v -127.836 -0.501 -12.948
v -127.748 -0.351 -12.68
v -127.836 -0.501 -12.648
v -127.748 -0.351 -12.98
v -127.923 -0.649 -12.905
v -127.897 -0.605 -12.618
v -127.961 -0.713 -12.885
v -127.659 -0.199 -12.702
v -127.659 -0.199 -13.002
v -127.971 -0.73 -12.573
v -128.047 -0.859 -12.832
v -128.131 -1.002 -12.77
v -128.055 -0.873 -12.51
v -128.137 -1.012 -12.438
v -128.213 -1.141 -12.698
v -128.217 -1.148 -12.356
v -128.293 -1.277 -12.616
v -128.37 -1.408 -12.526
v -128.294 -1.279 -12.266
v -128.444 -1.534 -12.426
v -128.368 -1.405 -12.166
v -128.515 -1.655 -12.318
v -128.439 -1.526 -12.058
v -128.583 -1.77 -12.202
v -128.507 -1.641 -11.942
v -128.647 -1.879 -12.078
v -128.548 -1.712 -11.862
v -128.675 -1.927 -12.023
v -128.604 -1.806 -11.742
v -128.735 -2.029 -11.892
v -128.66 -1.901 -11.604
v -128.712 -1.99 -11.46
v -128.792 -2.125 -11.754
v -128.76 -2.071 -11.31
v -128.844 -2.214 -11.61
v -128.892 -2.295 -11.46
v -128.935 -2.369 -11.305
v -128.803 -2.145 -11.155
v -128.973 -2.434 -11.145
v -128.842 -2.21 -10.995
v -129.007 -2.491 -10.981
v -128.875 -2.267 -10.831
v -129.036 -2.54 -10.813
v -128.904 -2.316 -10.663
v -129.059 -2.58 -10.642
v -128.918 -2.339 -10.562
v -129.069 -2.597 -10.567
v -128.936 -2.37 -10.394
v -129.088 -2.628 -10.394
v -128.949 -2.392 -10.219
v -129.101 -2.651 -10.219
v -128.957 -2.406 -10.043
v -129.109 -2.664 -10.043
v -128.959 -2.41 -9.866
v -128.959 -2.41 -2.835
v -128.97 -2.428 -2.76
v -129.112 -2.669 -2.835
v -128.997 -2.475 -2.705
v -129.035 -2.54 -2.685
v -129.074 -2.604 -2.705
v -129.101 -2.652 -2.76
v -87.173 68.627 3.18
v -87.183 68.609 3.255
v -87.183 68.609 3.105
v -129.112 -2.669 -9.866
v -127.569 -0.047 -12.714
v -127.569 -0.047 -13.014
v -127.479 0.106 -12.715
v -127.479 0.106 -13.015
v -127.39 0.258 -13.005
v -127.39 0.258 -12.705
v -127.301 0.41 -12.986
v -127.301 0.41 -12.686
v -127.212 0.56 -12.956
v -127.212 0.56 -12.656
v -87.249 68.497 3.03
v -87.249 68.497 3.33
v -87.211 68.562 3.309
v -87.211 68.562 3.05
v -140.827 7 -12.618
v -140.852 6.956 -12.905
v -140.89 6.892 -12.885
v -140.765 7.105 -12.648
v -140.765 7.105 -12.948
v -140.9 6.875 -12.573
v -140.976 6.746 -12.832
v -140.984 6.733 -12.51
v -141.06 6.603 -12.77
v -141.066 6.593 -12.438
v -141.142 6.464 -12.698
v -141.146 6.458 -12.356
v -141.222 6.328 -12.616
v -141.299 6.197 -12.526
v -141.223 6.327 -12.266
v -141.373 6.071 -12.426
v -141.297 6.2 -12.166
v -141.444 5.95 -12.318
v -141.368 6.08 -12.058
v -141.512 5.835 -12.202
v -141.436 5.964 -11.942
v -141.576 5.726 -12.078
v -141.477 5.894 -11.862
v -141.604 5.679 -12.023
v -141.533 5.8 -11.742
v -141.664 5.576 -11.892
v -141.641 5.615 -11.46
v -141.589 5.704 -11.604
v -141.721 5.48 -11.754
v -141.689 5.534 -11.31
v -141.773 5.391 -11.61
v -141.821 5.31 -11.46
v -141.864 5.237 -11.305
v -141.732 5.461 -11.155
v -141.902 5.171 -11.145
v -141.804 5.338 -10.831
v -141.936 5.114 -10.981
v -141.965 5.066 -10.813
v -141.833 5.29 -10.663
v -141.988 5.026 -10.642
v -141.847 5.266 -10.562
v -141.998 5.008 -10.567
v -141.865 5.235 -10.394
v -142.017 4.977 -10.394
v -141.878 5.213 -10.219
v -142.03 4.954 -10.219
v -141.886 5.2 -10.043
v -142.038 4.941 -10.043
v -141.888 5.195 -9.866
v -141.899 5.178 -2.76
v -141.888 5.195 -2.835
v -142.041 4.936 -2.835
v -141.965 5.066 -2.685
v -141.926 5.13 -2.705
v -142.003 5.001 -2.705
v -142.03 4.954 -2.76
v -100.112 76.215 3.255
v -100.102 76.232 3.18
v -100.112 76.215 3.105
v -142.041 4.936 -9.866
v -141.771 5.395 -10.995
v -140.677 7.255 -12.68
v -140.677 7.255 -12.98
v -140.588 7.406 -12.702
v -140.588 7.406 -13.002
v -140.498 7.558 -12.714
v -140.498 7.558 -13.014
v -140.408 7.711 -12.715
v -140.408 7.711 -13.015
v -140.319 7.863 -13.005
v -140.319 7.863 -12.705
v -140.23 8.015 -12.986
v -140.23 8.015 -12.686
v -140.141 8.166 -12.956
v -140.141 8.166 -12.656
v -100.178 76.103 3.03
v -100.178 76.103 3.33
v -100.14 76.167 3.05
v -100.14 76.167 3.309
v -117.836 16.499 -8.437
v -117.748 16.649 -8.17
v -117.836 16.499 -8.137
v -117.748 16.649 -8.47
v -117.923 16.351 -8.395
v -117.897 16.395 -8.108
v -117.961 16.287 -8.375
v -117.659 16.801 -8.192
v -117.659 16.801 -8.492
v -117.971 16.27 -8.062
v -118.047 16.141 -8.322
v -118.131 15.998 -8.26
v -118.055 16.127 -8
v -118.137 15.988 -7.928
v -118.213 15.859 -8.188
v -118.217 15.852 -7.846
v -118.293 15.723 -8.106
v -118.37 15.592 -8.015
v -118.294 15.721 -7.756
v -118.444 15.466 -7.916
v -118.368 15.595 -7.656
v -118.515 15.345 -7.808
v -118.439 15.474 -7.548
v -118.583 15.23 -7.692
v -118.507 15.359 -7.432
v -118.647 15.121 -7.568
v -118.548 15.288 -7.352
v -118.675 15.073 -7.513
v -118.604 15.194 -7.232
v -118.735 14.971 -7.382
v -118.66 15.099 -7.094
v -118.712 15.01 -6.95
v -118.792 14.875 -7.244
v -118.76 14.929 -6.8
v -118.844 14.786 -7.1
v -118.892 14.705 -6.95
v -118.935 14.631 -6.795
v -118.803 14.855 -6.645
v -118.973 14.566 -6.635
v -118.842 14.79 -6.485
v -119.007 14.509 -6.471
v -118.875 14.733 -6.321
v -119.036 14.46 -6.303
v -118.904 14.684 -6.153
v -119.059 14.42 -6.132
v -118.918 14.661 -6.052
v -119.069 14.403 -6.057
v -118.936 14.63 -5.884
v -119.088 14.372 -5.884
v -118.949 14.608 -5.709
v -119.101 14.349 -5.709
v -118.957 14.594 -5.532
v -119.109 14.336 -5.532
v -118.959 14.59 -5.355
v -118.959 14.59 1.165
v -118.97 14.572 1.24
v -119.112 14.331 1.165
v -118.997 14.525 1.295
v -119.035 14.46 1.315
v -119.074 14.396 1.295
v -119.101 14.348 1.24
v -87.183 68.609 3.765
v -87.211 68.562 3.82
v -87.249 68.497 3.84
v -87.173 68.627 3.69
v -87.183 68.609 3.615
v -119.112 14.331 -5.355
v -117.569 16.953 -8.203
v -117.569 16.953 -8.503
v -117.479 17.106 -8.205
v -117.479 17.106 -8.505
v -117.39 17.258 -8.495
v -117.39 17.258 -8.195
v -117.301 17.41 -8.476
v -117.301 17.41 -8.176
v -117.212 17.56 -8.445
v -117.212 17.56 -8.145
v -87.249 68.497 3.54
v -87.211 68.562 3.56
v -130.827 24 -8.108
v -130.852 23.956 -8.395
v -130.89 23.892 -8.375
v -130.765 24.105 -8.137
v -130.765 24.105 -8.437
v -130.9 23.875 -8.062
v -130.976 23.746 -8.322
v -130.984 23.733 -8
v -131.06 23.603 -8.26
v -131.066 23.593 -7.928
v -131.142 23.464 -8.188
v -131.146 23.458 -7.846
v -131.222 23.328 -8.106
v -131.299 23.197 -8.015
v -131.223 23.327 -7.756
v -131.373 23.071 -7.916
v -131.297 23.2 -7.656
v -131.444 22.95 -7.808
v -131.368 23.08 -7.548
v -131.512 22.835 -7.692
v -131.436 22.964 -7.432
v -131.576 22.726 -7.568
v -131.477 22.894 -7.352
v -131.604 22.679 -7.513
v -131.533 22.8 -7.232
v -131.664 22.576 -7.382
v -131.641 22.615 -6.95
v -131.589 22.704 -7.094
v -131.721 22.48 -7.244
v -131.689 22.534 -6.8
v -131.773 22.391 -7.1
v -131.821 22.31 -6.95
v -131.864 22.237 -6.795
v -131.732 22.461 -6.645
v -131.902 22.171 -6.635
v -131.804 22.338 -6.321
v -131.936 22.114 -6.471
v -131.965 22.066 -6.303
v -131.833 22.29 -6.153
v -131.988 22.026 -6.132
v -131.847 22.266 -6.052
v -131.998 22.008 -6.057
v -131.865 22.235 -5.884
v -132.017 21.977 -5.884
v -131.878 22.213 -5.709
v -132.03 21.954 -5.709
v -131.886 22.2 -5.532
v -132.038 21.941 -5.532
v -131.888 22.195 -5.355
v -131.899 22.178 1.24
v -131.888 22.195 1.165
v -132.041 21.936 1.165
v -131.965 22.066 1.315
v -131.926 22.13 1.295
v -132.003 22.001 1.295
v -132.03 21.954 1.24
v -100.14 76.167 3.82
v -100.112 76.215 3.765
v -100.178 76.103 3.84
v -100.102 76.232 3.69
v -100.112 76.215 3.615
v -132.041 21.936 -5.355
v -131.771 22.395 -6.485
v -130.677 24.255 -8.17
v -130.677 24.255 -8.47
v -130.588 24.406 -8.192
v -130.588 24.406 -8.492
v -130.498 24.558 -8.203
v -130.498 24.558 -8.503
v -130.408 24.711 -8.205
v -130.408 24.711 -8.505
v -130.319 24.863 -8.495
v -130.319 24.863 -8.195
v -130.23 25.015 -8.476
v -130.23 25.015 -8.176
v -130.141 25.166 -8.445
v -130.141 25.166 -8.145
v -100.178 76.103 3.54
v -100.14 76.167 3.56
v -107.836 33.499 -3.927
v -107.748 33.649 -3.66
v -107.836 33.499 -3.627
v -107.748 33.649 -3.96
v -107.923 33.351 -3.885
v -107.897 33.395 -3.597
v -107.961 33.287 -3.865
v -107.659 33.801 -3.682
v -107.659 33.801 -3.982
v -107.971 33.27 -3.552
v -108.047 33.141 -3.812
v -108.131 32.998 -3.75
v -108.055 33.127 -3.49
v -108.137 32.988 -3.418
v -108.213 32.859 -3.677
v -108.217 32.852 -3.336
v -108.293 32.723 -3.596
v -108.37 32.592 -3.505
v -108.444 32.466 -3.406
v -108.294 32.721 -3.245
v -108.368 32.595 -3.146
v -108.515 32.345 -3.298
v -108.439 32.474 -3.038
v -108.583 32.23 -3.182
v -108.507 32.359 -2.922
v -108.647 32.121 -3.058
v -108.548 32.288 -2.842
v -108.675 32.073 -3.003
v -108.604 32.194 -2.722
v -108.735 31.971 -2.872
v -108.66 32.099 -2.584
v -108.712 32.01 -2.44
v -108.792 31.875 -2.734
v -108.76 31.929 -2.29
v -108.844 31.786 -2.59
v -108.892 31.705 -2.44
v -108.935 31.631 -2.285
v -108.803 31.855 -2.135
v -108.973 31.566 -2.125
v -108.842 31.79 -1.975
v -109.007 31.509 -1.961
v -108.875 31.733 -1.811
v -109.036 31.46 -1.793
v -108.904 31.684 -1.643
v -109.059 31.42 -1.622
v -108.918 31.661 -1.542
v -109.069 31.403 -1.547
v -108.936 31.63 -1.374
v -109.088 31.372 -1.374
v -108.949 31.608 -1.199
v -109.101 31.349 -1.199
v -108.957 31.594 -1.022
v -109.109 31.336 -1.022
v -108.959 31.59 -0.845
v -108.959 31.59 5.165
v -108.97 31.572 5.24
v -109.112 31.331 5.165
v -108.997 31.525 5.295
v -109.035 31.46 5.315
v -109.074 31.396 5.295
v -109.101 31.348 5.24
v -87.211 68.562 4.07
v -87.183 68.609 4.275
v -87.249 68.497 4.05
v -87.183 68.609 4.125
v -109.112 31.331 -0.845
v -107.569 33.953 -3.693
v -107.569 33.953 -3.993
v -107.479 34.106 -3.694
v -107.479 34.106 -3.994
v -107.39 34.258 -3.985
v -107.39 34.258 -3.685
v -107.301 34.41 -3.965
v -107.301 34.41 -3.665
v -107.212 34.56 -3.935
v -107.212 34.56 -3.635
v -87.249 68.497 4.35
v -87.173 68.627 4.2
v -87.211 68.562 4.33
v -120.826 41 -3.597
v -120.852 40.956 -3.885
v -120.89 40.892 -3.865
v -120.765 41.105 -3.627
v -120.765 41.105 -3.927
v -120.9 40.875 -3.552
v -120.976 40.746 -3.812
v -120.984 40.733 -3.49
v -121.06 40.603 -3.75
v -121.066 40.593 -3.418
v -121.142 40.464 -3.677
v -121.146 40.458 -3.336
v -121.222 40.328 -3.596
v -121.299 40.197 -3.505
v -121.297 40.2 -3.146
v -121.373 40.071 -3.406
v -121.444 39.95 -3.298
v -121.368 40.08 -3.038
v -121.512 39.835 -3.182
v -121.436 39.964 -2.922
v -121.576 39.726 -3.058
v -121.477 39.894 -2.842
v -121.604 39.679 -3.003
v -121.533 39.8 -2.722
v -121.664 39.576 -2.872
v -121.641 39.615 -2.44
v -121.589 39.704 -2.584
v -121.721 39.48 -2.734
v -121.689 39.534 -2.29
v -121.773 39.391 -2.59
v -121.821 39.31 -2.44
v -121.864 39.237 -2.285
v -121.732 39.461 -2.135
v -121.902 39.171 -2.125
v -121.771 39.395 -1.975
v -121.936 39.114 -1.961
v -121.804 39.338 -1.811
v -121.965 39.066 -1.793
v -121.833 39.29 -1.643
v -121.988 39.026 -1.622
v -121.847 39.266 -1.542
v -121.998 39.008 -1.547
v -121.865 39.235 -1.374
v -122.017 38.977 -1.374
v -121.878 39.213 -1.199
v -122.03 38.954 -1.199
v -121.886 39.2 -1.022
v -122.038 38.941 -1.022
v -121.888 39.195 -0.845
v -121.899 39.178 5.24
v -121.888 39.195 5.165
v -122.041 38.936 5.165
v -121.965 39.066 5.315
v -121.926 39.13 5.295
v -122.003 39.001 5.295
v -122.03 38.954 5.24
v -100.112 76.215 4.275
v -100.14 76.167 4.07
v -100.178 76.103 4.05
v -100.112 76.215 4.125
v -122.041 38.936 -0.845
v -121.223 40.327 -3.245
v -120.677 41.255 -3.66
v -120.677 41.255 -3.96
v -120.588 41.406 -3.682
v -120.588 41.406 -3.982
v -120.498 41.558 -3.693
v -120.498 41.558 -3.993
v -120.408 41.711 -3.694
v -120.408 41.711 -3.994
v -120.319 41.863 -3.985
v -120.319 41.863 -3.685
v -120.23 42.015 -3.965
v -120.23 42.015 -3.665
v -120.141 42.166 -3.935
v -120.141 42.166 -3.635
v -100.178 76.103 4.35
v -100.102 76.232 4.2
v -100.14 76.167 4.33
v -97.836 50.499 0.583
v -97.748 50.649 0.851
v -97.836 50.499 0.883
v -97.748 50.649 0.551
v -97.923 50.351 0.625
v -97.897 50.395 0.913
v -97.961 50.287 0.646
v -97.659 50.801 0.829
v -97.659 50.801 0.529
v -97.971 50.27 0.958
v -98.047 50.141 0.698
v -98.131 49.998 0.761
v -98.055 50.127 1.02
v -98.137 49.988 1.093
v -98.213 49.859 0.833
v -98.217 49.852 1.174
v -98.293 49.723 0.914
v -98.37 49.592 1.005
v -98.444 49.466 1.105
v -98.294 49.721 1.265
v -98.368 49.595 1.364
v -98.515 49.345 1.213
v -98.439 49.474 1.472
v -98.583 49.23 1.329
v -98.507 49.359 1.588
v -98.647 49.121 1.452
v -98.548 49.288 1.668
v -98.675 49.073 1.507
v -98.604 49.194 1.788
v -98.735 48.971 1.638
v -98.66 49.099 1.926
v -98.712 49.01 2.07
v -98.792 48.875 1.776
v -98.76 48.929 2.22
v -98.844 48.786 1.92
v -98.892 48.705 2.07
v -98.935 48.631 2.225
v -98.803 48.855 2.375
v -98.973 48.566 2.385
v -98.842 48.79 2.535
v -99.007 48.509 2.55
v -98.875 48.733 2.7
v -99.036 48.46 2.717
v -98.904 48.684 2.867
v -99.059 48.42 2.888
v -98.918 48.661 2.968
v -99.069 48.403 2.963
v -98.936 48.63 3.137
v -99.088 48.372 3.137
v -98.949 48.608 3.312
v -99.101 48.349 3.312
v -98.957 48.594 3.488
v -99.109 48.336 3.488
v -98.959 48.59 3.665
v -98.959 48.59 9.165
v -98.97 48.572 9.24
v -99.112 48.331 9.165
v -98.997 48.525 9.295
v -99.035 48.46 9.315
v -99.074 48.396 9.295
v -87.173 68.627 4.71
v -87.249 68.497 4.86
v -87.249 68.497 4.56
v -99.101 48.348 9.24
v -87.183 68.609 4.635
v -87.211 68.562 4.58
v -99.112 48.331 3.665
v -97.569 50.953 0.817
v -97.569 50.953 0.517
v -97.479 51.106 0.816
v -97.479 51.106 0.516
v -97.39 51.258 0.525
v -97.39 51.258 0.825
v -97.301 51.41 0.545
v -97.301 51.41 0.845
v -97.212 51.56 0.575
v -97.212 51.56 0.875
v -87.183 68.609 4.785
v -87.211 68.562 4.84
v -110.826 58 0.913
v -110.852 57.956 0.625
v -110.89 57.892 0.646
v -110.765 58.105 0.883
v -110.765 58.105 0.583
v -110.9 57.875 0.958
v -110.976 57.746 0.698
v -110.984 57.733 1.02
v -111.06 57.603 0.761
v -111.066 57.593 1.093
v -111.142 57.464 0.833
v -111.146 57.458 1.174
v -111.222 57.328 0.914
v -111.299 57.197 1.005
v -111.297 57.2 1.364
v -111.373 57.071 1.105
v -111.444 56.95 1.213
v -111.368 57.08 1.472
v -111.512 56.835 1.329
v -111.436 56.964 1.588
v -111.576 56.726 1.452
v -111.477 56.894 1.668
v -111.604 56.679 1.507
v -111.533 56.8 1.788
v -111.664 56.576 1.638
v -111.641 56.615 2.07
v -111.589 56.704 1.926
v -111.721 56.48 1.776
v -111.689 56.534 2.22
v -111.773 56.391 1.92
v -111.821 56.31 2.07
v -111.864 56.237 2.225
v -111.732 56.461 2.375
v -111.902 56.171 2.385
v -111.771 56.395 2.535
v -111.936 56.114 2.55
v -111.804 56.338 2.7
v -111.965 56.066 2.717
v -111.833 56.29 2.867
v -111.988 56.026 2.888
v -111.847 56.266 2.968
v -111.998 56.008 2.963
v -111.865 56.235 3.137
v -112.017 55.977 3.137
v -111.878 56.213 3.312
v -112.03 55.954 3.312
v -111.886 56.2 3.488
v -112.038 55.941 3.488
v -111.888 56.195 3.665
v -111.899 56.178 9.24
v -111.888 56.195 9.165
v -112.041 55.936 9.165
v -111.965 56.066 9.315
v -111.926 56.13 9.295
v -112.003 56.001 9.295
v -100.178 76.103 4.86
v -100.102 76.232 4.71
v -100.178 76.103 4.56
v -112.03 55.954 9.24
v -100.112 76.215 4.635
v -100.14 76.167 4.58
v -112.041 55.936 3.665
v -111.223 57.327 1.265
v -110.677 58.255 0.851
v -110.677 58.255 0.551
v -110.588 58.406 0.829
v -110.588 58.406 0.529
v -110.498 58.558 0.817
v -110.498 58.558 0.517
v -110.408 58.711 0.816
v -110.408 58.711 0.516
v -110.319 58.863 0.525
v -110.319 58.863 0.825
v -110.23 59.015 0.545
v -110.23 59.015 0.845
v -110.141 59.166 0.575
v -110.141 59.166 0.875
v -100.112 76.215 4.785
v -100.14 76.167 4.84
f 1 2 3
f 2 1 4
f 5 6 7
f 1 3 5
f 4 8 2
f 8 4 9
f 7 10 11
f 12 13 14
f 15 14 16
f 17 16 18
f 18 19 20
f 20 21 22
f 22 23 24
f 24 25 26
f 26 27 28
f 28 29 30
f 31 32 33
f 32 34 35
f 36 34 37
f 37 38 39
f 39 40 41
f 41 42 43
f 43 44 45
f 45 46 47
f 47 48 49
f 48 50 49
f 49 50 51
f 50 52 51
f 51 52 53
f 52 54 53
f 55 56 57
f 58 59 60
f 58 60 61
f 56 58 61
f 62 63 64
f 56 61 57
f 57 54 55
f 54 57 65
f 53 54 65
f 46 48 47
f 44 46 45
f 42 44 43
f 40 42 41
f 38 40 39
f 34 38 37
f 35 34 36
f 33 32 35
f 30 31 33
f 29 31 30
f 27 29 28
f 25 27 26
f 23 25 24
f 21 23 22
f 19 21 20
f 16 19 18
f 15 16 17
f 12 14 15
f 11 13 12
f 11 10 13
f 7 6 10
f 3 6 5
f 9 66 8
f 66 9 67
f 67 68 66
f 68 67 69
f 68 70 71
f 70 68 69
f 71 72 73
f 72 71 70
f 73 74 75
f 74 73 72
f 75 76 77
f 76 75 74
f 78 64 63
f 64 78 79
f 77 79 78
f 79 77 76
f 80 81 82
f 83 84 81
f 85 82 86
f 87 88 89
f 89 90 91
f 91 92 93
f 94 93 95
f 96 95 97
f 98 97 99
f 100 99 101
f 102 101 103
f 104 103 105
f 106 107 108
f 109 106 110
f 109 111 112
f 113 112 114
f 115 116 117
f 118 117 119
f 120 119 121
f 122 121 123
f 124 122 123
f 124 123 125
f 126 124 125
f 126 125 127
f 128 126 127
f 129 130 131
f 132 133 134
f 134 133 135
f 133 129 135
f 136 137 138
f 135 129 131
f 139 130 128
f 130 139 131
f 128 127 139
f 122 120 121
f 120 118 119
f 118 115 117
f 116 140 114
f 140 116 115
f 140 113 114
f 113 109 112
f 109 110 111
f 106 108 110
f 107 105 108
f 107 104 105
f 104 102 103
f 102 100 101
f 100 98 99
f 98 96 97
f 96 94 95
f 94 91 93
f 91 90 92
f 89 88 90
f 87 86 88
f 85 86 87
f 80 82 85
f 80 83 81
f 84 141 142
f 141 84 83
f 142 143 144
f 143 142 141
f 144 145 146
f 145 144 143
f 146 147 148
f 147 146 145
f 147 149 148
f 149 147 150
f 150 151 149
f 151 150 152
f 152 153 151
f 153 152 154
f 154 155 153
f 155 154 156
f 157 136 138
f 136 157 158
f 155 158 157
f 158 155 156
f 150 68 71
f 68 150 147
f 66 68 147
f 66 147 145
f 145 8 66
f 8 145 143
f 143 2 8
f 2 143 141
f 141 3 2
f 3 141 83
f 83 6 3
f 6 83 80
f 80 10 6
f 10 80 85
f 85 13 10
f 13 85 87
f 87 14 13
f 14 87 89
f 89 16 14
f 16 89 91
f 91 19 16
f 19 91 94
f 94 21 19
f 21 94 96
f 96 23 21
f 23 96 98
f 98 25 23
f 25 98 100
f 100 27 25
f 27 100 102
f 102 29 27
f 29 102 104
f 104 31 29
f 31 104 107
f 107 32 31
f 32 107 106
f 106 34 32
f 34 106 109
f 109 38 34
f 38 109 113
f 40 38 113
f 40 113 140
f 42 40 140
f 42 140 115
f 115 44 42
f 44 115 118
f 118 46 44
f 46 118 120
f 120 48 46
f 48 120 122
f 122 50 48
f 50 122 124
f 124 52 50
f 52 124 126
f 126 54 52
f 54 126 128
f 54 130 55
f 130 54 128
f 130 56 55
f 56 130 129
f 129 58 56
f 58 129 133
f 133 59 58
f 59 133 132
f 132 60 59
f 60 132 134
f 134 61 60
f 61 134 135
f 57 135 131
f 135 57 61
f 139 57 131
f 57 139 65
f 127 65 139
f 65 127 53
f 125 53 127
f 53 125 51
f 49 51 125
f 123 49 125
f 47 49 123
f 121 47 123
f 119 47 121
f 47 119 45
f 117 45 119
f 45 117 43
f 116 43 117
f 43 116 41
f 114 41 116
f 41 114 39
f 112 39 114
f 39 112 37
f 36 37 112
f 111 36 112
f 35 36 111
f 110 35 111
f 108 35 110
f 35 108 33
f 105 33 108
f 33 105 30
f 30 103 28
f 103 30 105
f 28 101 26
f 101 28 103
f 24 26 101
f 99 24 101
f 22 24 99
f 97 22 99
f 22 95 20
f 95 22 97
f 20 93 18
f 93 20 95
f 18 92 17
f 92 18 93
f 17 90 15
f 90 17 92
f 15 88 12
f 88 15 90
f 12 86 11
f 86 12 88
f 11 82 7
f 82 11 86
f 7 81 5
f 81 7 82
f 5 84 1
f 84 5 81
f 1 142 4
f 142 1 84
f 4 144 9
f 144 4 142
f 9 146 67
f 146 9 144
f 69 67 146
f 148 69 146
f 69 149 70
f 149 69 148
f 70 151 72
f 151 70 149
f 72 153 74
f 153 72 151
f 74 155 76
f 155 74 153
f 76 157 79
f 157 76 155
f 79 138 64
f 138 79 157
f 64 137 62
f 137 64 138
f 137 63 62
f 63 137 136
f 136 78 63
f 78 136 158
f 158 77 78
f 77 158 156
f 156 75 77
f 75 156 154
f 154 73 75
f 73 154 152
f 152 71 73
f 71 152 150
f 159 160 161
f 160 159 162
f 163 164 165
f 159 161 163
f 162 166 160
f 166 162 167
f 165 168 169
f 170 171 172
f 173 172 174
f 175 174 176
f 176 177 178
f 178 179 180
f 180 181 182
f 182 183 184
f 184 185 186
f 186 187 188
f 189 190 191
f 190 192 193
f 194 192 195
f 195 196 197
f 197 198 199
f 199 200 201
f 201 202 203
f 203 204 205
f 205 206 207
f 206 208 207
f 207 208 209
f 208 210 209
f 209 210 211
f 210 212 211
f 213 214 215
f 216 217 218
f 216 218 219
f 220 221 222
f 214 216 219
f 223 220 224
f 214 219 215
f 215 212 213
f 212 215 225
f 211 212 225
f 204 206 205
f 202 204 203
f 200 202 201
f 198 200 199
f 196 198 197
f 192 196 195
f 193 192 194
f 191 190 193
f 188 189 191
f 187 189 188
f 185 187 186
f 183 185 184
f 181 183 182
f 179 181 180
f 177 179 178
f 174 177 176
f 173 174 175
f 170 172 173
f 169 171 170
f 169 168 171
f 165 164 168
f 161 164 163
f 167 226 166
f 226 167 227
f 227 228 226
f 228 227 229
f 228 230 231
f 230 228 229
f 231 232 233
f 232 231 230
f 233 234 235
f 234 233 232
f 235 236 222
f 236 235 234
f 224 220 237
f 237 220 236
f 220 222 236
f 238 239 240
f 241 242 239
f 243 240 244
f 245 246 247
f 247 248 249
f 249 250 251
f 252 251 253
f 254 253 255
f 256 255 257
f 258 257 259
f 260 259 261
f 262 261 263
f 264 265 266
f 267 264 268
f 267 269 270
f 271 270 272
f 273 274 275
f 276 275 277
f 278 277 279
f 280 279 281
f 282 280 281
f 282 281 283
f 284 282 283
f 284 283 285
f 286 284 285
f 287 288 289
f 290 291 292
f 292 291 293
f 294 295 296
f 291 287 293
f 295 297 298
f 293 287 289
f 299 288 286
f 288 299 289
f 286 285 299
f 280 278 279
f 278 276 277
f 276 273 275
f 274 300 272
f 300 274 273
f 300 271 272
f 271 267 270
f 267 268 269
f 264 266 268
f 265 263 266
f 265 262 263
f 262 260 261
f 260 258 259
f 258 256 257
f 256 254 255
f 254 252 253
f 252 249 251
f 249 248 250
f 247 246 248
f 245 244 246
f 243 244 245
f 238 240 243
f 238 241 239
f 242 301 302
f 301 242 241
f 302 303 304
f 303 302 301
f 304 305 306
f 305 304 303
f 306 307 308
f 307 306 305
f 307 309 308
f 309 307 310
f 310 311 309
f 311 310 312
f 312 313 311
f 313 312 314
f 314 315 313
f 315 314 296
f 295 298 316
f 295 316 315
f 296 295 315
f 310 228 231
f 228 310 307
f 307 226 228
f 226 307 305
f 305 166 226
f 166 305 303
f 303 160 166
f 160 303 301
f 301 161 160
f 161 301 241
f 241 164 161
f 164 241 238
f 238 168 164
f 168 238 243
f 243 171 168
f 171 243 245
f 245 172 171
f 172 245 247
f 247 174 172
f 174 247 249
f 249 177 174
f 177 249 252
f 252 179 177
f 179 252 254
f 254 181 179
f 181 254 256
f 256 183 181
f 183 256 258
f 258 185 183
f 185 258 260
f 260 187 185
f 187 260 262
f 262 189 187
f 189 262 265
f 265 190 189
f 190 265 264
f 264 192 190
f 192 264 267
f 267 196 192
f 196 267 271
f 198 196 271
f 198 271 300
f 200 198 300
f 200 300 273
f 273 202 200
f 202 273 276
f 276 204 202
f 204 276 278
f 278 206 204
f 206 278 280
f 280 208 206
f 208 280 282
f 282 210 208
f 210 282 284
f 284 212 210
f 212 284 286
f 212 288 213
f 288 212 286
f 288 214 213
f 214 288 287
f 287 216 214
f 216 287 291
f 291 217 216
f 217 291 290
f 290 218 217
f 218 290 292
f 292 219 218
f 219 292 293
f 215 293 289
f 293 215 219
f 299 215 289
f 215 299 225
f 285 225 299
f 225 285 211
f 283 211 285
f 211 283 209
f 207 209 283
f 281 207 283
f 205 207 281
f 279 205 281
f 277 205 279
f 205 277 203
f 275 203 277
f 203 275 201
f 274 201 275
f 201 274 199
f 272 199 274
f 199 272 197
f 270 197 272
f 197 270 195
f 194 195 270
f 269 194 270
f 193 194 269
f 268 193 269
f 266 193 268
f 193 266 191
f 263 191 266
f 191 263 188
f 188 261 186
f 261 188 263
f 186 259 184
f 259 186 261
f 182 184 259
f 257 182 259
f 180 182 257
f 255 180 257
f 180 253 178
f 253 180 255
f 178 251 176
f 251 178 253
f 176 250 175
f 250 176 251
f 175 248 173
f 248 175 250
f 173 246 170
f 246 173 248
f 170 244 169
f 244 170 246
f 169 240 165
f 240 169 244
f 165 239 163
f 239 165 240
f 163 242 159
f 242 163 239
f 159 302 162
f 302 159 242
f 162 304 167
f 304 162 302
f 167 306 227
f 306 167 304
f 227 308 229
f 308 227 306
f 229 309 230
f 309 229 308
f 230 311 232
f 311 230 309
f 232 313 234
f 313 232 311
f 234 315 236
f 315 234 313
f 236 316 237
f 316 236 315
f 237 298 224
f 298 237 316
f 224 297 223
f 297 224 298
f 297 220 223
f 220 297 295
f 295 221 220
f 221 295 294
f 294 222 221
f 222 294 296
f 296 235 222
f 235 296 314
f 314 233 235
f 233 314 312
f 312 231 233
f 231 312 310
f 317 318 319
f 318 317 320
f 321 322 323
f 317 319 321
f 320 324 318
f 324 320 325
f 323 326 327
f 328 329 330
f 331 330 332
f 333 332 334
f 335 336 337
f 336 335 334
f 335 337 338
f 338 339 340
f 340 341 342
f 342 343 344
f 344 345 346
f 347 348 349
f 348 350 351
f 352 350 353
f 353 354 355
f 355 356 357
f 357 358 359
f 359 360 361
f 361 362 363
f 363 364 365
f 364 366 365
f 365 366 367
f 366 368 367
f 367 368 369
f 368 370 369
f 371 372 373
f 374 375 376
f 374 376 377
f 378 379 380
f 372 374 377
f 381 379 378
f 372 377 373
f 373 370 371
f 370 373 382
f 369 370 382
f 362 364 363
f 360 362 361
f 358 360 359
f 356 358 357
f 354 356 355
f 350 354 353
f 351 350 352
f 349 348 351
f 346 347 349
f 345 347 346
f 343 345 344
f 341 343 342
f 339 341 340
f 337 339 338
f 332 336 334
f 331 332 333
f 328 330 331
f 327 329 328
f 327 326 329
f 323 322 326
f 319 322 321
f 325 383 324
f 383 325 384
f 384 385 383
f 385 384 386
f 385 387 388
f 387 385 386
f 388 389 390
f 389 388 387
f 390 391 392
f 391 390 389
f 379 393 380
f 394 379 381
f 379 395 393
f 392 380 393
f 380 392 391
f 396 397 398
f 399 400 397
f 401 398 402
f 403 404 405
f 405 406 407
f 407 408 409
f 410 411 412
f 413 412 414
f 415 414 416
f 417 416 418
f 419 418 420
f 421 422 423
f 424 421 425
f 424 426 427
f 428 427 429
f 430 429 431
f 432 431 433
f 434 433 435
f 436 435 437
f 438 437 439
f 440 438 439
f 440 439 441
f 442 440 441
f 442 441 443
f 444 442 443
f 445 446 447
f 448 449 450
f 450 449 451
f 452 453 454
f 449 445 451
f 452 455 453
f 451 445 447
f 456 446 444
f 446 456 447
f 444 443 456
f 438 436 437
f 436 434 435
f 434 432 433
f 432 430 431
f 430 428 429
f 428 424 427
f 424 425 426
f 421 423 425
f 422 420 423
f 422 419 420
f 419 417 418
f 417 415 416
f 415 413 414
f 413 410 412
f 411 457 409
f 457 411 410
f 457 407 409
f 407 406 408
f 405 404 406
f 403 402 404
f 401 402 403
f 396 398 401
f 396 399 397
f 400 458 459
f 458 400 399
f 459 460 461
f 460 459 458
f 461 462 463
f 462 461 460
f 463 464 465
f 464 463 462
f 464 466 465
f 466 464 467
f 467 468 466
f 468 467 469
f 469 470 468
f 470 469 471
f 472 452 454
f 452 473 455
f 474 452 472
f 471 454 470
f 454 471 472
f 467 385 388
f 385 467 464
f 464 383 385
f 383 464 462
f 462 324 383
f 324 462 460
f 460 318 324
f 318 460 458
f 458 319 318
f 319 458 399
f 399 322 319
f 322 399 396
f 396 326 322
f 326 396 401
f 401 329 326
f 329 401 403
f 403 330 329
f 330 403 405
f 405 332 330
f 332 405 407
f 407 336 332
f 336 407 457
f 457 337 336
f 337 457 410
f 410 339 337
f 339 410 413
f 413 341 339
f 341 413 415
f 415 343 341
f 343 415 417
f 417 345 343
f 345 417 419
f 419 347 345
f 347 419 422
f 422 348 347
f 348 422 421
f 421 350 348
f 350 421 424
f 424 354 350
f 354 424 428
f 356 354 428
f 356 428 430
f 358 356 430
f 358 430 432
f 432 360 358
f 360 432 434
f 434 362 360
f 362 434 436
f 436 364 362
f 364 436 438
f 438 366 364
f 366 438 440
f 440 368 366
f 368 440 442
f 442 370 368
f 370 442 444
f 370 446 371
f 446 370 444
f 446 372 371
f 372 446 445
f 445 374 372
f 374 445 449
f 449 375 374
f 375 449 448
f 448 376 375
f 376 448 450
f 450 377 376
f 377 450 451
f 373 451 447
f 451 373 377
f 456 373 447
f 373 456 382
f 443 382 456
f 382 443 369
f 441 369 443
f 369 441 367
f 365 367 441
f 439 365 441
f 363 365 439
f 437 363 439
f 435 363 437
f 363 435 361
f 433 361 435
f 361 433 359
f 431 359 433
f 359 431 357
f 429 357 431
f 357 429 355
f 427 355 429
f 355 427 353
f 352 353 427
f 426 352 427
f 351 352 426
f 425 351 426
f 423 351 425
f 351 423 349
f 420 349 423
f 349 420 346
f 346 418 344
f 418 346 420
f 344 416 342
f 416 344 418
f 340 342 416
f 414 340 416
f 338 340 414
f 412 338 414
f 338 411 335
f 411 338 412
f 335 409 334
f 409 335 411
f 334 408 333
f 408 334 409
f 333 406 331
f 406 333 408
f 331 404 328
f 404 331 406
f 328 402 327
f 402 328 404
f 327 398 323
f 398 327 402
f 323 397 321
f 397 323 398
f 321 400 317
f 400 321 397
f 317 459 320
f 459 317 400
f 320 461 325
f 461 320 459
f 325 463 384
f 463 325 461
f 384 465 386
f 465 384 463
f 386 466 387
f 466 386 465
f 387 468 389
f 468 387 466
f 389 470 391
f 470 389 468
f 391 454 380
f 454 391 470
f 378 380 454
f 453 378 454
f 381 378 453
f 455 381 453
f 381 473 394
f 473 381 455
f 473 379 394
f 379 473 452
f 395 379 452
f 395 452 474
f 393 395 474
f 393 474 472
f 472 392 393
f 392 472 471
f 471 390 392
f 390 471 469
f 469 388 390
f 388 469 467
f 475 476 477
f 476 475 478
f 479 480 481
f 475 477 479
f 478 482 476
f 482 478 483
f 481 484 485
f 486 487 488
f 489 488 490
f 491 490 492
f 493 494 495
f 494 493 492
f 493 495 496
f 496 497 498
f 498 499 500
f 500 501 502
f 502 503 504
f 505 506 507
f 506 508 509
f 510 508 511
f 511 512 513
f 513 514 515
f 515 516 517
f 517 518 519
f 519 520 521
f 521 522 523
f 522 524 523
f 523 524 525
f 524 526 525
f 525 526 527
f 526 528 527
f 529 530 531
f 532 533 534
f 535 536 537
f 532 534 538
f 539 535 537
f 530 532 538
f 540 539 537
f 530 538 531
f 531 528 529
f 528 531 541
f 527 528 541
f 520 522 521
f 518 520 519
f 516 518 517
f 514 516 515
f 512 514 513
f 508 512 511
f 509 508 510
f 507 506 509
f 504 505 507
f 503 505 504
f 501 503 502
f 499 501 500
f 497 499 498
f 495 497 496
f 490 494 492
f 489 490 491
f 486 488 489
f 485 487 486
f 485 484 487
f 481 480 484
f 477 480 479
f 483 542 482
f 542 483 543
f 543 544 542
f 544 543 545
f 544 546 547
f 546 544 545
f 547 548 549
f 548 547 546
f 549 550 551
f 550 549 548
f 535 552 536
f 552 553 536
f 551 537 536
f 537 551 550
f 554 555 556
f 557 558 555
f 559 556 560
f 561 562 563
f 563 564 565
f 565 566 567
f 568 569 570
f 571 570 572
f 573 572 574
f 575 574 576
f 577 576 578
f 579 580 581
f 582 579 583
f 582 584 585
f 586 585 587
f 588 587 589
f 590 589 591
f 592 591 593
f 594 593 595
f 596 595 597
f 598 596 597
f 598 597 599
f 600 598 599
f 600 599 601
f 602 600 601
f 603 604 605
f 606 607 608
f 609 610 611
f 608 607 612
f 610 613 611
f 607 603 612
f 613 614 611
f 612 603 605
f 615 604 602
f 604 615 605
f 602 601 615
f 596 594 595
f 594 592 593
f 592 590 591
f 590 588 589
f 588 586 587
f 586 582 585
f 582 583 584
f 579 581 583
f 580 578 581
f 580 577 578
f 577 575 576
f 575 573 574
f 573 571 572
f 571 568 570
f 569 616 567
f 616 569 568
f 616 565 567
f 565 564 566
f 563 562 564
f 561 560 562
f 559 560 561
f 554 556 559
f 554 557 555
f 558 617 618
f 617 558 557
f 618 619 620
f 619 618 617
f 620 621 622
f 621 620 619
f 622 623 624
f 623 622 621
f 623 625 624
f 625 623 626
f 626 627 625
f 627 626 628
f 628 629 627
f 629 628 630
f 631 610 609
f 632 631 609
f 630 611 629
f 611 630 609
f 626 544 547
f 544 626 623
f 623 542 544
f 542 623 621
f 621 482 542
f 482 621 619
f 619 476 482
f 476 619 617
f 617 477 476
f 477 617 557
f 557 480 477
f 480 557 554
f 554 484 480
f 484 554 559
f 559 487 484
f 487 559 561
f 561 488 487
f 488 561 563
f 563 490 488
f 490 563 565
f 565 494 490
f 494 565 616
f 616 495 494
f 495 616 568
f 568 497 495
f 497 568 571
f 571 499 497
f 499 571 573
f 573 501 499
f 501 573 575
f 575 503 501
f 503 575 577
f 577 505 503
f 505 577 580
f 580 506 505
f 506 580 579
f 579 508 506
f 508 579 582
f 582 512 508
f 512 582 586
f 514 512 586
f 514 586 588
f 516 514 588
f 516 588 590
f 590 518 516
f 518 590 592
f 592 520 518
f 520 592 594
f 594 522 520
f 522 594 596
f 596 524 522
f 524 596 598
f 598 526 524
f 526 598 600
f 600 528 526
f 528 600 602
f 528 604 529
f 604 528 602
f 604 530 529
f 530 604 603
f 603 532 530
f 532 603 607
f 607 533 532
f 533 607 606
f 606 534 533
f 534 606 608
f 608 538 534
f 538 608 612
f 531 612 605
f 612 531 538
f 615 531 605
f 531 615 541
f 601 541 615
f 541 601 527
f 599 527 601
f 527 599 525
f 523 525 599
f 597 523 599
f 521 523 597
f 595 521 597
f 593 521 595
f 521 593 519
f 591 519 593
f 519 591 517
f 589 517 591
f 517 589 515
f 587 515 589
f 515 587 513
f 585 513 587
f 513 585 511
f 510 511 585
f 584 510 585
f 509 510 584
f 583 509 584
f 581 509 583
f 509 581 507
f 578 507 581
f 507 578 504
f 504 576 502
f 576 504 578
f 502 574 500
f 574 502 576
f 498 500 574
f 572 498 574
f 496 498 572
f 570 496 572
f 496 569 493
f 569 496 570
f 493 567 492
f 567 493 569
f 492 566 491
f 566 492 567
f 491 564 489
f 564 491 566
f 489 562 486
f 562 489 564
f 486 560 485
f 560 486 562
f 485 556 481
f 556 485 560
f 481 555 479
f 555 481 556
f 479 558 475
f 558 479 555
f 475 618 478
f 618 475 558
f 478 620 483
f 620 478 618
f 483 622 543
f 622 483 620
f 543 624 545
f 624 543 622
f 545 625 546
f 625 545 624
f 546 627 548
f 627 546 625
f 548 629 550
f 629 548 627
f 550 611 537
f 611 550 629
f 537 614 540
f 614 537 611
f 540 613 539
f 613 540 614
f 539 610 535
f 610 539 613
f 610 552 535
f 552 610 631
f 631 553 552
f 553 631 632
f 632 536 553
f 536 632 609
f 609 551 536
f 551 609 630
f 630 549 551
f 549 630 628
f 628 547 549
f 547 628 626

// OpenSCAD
// The boards' FFCs to the outlet in the back of the housing
//
// SUPERSEDED by main_pcb.scad: the cables now end on the main PCB. Only
// back_outlet() is still used, by housing.scad, for the bass cable.
//
// The simplest route: each cable leaves its board's connector straight down,
// is bent once about its width towards its normal, and runs straight from
// there through an outlet in the housing's back face. No further bending.
//
// All four connectors lie in one vertical plane, each the one before moved by
// a staircase step (10, 17, 4), which runs exactly along the straight parts.
// So the four cables lie on one another: board 0's lowest, each next one
// stack_pitch higher (measured square to the cables), the same bend for all;
// only the straight lead below each connector differs, the top cable (board
// 3's) keeping lead. Each cable comes down onto the ones below it from above
// (a bend stays above its own straight part), so none crosses another.
//
// The connector stands square to the housing's slanted -x face (pcb.scad):
// its long side, so the cable's width, lies along that face's normal. The
// cable's normal then points along the face, towards the back (+x, +y), so
// after the bend it runs parallel to the slanted face, in the vertical plane
// through the connector's centre, along the hole behind that face (see
// housing.scad). The bend is 90 deg plus the rise of the housing's bottom
// along that direction (11.5 deg): straight on, the cable stays parallel to
// the hole's floor, 3.8 mm above it, below the connectors (5.3 mm), screw
// bosses and ribs (3.8 mm) of boards 1-3, beside the hole-1 guide tubes
// (0.8 mm in plan). (At exactly 90 deg it would run level and leave through
// the rising bottom under board 2 instead of the back face.) It meets row 3's
// back wall obliquely, 30.5 deg off its normal: a flat cable cannot turn in
// its own plane.
//
// Coordinates: board 0's frame, as everywhere.
//
// make builds   openscad -o ../build/discant/back_cable.stl back_cable.scad   (the cable)
// housing.scad uses back_outlet() for the hole in the back wall.
// Figures in the description above are for board 0's cable before the stack;
// it now runs (n_cables - 1) * stack_pitch lower, the top one there.

/* [From pcb.scad / housing.scad, do not edit here] */
step     = [10, 17, 4];          // staircase
con_c    = [-135.5, 1.2631];     // board 0's connector centre
con_rot  = atan2(step[1], step[0]);   // turned from y towards -x
face_z   = -0.835 - 5.5;         // connector face: bottom copper - body height
slope    = step[2] / step[1];    // the housing's bottom rises with the staircase
back_y   = 3 * step[1] + 10.6 + 0.7;   // housing's back face behind board 3 (cover outline)
back_t   = 1.2;                  // its wall round the hole

/* [Cable: 14-way FFC, 1.0 mm pitch] */
ffc_w    = 15;                   // width
ffc_t    = 0.3;                  // thickness
insert   = 3.5;                  // inside the connector
lead     = 2;                    // straight below the connector face (stiffener)
bend_r   = 3;                    // bend radius, at the cable's centre (rMin 2)
tail     = 10;                   // beyond the back face, along y
n_cables = 4;                    // boards 0 .. 3
stack_pitch = 0.5;               // cable to cable, square to them: 0.2 between the films

/* [Outlet] */
outlet_w = ffc_w + 1;            // hole in the back wall: 0.5 beside the cable each side
outlet_h = (n_cables - 1) * stack_pitch + ffc_t + 2 * 0.85;   //   and 0.85 above and below the stack

$fa = 2; $fs = 0.2;

// the cable's plane: x' along its run in plan (the cable's normal at the
// connector), y' = z; the width lies along u (towards contact 1)
run  = [cos(con_rot), sin(con_rot)];        // in plan, towards the back
u    = [-sin(con_rot), cos(con_rot)];
rise = atan(slope * run[1]);                 // the bottom's rise along run
bend = 90 + rise;                            // turned by this from straight down
dir    = [cos(rise), sin(rise)];             // straight on, after the bend
nrm    = [-sin(rise), cos(rise)];            // square to it, up
// cable k in its own board's frame, (x', z'), from inside the connector:
// its lead puts it (n_cables - 1 - k) * stack_pitch below the top one
function lead_of(k) = lead + (n_cables - 1 - k) * stack_pitch / cos(rise);
function arc_c(k) = [bend_r, face_z - lead_of(k)];
function arc_pt(k, a) = arc_c(k) + bend_r * [-cos(a), -sin(a)];   // a = 0 at the lead's end
function p_arc(k) = arc_pt(k, bend);
// straight part: to tail beyond the back face (along y)
function x_back(k) = (back_y - k * step[1] - con_c[1]) / run[1];   // x' where it meets the back face
function s_end(k) = (x_back(k) + tail / run[1] - p_arc(k)[0]) / dir[0];
function p_end(k) = p_arc(k) + s_end(k) * dir;
function at(k, q) = [con_c[0] + q[0] * run[0], con_c[1] + q[0] * run[1], q[1]] + k * step;   // -> board 0's frame
function z_back(k) = p_arc(k)[1] + (x_back(k) - p_arc(k)[0]) * dir[1] / dir[0];

for (k = [0 : n_cables - 1])
    echo(str("cable ", k, ": lead ", lead_of(k), ", bend ", bend, " deg (R ", bend_r, "), then straight at ", rise,
             " deg; leaves the back face at ", at(k, [x_back(k), z_back(k)]), "; free length ",
             lead_of(k) + bend_r * bend * PI / 180 + s_end(k), " mm from the connector face"));

// the plane of the cable, (x', z') in it, extruded along u by the width
module in_plane(k)
    translate(k * step)
    multmatrix([[run[0], 0, u[0], con_c[0]],
                [run[1], 0, u[1], con_c[1]],
                [0,      1, 0,    0],
                [0,      0, 0,    1]])
        children();

module centre_line2d(k)
    union() {
        hull() { translate([0, face_z + insert]) circle(d = ffc_t, $fn = 12);
                 translate([0, face_z - lead_of(k)]) circle(d = ffc_t, $fn = 12); }
        for (i = [0 : 29]) hull() {
            translate(arc_pt(k, bend * i / 30)) circle(d = ffc_t, $fn = 12);
            translate(arc_pt(k, bend * (i + 1) / 30)) circle(d = ffc_t, $fn = 12);
        }
        hull() { translate(p_arc(k)) circle(d = ffc_t, $fn = 12); translate(p_end(k)) circle(d = ffc_t, $fn = 12); }
    }

module back_cable(k)
    in_plane(k) translate([0, 0, -ffc_w / 2]) linear_extrude(ffc_w) centre_line2d(k);

module back_cables() for (k = [0 : n_cables - 1]) back_cable(k);

// the outlet: a slot along the straight parts, round the whole stack, from
// just inside the hole until past the back face, outlet_w across and
// outlet_h through
module back_outlet()
    in_plane(0) translate(p_arc(0) + (n_cables - 1) / 2 * stack_pitch * nrm) rotate(rise)
        translate([(x_back(0) - p_arc(0)[0]) / dir[0] - 15, -outlet_h / 2, -outlet_w / 2])
            cube([30, outlet_h, outlet_w]);

back_cables();
